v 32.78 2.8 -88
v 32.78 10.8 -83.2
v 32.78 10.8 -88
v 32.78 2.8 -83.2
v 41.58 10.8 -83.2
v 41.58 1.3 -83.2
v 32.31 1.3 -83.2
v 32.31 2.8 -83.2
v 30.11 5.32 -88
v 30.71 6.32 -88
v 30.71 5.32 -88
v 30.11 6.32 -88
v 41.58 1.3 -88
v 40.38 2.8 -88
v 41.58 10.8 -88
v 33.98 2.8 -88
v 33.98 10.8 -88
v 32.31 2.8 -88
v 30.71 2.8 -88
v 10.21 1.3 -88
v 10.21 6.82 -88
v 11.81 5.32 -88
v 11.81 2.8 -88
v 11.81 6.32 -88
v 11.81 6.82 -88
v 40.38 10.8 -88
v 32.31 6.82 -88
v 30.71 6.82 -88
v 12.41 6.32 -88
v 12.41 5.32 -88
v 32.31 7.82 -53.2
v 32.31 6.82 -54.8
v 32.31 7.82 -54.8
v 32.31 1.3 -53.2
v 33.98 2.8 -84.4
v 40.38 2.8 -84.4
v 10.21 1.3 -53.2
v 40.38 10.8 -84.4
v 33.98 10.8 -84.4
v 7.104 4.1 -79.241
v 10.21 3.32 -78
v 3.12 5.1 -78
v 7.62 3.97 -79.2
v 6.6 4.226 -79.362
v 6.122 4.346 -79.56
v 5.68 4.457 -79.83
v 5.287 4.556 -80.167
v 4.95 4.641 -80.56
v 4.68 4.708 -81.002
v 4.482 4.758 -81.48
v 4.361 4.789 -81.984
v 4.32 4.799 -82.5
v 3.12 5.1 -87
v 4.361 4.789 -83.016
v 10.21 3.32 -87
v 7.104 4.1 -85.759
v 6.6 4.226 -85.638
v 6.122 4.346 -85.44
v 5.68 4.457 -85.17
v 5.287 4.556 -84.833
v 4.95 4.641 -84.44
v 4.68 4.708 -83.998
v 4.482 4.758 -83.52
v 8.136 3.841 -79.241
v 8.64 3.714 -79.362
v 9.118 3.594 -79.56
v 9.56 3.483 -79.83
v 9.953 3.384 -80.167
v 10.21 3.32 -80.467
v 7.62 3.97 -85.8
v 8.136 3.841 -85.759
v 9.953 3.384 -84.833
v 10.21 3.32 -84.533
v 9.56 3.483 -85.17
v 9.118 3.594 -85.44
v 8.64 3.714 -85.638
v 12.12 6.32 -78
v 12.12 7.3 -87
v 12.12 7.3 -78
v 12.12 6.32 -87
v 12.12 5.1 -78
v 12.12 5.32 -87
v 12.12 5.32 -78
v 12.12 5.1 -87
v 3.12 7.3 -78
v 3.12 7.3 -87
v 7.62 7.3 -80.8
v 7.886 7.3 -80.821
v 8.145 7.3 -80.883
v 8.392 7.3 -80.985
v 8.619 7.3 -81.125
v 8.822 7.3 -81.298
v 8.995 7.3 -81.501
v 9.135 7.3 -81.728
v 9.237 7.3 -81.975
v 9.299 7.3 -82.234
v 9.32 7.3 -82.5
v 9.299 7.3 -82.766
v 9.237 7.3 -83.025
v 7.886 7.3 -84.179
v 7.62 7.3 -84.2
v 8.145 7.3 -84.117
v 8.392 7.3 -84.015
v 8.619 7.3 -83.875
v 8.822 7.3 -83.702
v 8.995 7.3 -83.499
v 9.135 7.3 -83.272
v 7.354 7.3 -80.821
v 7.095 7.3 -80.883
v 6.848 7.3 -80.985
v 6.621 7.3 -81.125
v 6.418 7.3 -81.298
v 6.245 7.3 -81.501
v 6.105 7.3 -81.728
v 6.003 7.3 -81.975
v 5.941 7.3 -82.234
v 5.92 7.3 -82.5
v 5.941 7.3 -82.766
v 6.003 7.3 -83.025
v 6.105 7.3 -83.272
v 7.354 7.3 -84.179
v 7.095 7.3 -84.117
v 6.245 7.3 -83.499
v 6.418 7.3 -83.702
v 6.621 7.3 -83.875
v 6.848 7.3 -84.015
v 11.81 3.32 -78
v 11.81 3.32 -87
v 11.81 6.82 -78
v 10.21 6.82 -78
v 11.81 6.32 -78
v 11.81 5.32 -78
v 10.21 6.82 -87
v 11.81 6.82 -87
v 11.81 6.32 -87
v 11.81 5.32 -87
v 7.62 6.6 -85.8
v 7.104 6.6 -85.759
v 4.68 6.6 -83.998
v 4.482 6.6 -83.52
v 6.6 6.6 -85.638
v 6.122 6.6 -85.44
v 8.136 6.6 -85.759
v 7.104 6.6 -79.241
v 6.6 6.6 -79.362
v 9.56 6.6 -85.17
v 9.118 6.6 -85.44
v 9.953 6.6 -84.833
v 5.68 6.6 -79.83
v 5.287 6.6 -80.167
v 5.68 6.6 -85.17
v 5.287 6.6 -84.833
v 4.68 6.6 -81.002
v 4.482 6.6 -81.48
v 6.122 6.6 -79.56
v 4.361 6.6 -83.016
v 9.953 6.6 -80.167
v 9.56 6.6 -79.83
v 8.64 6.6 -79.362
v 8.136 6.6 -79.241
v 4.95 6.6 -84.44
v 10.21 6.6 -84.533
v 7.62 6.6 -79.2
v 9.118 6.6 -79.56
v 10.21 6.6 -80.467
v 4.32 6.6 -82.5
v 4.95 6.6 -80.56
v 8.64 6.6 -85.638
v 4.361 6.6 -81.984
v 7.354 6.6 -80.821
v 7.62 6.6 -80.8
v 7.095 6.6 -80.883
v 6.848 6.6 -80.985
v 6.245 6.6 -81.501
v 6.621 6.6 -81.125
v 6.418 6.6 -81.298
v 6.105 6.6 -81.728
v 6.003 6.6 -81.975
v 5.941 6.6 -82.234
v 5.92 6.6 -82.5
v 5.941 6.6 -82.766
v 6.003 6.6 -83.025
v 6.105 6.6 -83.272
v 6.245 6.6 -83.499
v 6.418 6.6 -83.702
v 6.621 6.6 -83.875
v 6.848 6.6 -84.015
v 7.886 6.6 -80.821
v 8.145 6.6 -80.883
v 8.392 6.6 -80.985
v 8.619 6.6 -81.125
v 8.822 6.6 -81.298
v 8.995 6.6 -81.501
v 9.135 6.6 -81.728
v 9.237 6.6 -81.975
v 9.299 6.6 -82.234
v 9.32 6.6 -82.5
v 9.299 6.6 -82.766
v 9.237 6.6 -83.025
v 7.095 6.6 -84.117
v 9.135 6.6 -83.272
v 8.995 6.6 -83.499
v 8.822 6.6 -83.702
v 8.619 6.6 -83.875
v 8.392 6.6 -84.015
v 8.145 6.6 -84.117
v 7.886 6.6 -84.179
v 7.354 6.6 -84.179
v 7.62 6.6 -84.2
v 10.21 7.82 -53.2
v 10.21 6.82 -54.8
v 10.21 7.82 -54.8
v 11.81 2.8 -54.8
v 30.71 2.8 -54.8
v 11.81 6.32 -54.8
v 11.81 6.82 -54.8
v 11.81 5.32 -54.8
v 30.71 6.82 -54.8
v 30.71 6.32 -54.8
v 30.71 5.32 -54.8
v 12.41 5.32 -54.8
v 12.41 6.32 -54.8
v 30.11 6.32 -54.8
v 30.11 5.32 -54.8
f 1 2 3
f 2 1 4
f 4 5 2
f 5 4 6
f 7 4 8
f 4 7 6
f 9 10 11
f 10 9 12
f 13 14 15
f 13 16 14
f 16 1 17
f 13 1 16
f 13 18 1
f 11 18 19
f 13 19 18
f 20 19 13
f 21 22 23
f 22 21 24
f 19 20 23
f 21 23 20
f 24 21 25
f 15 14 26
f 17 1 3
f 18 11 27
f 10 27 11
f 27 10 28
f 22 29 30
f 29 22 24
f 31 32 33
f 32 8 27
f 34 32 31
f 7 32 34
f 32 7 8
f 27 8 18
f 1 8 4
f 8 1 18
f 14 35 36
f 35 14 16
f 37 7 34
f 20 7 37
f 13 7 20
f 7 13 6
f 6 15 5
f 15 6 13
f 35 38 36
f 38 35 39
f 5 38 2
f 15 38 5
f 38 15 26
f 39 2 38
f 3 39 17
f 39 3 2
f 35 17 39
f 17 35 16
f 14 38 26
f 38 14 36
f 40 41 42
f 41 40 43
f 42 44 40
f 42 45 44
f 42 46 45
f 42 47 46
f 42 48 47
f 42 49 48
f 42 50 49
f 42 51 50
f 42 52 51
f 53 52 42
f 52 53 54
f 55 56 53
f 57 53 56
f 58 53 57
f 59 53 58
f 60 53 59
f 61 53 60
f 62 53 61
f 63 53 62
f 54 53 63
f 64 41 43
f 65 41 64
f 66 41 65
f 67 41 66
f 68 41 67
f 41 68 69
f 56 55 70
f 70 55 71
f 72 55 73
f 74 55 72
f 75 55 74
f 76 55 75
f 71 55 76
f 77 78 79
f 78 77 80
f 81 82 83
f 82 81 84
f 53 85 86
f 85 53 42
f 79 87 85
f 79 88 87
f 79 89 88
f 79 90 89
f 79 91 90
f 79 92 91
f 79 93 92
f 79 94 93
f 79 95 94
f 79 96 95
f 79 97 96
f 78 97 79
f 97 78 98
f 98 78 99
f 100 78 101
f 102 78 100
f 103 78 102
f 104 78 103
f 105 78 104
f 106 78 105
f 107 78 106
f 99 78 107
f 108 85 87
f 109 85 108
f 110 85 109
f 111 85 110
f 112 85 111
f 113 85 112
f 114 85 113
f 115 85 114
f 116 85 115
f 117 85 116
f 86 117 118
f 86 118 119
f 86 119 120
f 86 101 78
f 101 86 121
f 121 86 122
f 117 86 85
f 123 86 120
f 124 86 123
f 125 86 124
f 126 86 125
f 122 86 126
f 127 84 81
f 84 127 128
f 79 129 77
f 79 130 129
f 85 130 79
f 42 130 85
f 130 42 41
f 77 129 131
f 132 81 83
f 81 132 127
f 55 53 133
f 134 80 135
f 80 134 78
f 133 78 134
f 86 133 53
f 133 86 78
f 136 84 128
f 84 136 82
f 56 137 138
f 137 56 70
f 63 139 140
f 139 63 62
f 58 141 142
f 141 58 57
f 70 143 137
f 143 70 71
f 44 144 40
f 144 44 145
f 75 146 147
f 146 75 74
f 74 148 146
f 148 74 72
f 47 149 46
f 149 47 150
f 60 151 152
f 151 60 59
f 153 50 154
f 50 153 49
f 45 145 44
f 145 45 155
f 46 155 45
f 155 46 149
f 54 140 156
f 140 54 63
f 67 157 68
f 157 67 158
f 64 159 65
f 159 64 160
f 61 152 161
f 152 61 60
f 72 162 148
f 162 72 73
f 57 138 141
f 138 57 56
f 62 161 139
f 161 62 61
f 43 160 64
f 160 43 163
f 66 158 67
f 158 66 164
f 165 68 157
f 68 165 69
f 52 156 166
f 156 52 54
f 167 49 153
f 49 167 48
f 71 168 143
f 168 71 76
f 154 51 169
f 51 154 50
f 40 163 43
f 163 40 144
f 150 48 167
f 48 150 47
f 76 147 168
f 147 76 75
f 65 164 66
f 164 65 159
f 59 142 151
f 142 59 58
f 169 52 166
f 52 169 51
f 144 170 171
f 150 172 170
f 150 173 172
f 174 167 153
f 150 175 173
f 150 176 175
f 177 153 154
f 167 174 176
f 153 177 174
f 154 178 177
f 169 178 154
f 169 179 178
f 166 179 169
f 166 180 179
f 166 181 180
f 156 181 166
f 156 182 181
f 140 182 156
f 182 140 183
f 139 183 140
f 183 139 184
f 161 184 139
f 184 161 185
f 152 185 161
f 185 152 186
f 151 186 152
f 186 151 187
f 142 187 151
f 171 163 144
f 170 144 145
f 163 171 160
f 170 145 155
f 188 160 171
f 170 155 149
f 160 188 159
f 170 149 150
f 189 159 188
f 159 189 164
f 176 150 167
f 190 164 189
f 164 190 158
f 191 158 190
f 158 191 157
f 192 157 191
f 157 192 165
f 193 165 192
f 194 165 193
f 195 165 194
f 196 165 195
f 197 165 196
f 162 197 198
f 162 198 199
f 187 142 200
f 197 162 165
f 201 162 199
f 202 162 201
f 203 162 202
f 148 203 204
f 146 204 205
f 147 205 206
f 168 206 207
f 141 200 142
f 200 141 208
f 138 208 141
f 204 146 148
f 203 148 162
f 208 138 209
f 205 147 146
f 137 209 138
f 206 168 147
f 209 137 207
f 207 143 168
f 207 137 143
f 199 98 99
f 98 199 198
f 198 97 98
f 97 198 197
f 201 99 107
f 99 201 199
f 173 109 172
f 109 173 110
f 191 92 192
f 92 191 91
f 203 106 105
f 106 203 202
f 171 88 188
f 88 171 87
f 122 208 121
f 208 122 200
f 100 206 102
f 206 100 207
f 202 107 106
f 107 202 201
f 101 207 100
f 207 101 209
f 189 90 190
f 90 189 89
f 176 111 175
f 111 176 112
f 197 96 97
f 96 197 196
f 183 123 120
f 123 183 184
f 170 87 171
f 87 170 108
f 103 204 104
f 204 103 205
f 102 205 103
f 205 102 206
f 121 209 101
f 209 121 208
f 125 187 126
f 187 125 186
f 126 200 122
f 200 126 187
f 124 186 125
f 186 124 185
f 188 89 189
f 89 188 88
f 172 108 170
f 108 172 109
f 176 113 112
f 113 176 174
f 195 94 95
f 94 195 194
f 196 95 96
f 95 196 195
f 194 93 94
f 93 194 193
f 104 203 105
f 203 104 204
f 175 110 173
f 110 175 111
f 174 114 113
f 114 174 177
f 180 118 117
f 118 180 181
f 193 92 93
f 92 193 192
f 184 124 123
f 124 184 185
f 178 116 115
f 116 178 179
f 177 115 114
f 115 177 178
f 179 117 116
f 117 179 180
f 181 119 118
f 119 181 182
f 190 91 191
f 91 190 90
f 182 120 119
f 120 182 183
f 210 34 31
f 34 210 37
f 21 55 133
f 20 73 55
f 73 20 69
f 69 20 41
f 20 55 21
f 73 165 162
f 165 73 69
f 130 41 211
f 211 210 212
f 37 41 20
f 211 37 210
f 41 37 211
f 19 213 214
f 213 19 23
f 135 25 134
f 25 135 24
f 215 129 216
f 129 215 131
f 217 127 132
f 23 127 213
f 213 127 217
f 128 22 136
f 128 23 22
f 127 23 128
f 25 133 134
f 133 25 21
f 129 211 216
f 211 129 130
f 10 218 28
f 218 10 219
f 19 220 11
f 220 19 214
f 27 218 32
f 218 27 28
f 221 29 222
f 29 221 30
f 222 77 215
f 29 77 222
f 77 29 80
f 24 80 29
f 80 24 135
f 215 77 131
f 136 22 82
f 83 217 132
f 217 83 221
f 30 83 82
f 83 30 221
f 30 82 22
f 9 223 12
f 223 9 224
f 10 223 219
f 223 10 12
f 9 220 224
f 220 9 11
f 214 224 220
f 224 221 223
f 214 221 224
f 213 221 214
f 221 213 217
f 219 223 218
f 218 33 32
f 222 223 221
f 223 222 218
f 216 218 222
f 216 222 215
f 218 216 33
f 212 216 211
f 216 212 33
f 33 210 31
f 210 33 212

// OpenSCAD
// SuperMini nRF52840 cradle for Scylla (no-trackball, handwired wireless).  v2 (2026-07-14)
// Designed in the Scylla CASE frame so USB-C registers to the measured slot.
// Measured (STL, 2026-07-14): -Z outer wall z=-90.3 (~2.3mm); USB-C slot (21.26,4.62) 9.75x3.5;
//   reset hole (37.18,4.43) ~5.25dia. Bottom-plate bolt bosses (dia~5.85, seat y=-1.96):
//   nearest-wall = C(-13.21,-82.92); secondary = F(45.10,-40.66).
// v2 changes vs v1: board pocket -> measured 17.91x33.90; reset button 4x4 -> 6x6 and pushed
//   FLUSH to the inner wall (closes the ~5mm gap user reported); + two mounting EARS (to boss C & F)
//   with oversized/slotted holes (tolerance) so USB slot is the primary alignment.
$fn = 40;

// ---- measured case refs ----
usb   = [21.26, 4.62];    // USB-C slot centre (x, y=height)
rst   = [37.18, 4.43];    // reset hole centre
wall_z = -90.3;           // -Z outer wall
wall_t = 2.3;             // wall thickness -> inner face
inner  = wall_z + wall_t; // board front butts here (-88.0)

// ---- SuperMini board (user-measured 17.91 x 33.90) ----
// v3 (2026-07-18): pocket was too tight (board jammed, un-removable). Loosened:
//   bw 18.3->18.9 (~0.5mm/side), bl 34.3->34.8, lip 1.2->0.6 so board slides out.
bw   = 18.9;              // width  + clearance (board 17.91, ~0.5mm/side)
bl   = 34.8;              // length + clearance (board 33.90)
bx0  = usb[0] - bw/2;     // board left x
by   = 2.8;              // PCB bottom height (USB-C centre ~4.6)
fl   = 1.5;              // cradle floor
rail = 1.6;             // side rail
lip  = 0.6;             // retaining lip over board top (light — removable)
railh = (usb[1]-by) + 2.2;  // rail height above floor (over the PCB)

// ---- reset push-button (6x6, user's tactile) held FLUSH to the inner wall ----
btn  = 6.4;              // 6x6 button + clearance
bdep = 3.6;              // button body depth along Z (front face sits at z=inner)
module reset_holder() {
  rx = rst[0];
  // floor arm linking the holder to the cradle's +x rail
  translate([usb[0]+bw/2+rail, by-fl, inner]) cube([rx-btn/2-1.2-(usb[0]+bw/2+rail), fl, bdep+1.2]);
  // floor under the button
  translate([rx-btn/2-1.2, by-fl, inner]) cube([btn+2.4, fl, bdep+1.2]);
  // back stop (+Z) so the button FRONT stays at z=inner (against the case wall) -> no gap
  translate([rx-btn/2-1.2, by-fl, inner+bdep]) cube([btn+2.4, fl+btn+1.6, 1.2]);
  // side walls (X) — open at top to drop the button in, open front (-Z) so actuator reaches the wall hole
  translate([rx-btn/2-1.2, by-fl, inner]) cube([1.2, fl+btn+1.6, bdep+1.2]);
  translate([rx+btn/2,     by-fl, inner]) cube([1.2, fl+btn+1.6, bdep+1.2]);
}

// ---- SINGLE mount -> boss B, the CLOSE boss (v4, 2026-07-18) ----
// User: use the nearer boss. B at x=7.62 is only ~2.6mm left of the cradle rail (rail left face
// x=bx0-rail). B collar-top y≈7.3 ≈ the rail TOP (y≈6.8), so a SHORT near-level tab off the rail
// top reaches it → minimal overhang. M3 screw down into B's insert.
mhc = 3.4;                              // M3 clearance
hbX = 7.62; hbZ = -82.50; hbT = 7.3;    // boss B (close, high collar ≈ rail top)
railTopY = (by-fl) + fl + railh;        // cradle rail top (~6.82)
module mount_tabB(){
  difference(){
    hull(){
      // root: grab the top of the left rail
      translate([bx0-rail, railTopY-3.5, hbZ-4.5]) cube([1.6, 3.5, 9]);
      // pad over boss B (top face at collar height)
      translate([hbX-4.5, hbT-2.2, hbZ-4.5]) cube([9, 2.2, 9]);
    }
    // counterbore so the boss post nests (d~5.9 up to collar) + M3 screw hole through the pad
    translate([hbX, -0.1, hbZ]) rotate([-90,0,0]) cylinder(d=6.6, h=hbT-0.6);
    translate([hbX, hbT-2.4, hbZ]) rotate([-90,0,0]) cylinder(d=mhc, h=4);
  }
}

module cradle() {
  difference() {
    union() {
      // floor under the board
      translate([bx0-rail, by-fl, inner]) cube([bw+2*rail, fl, bl]);
      // side rails
      translate([bx0-rail,        by-fl, inner]) cube([rail, fl+railh, bl]);
      translate([usb[0]+bw/2,     by-fl, inner]) cube([rail, fl+railh, bl]);
      // retaining lips (overhang the board top so it snaps in)
      translate([bx0-rail,            by-fl+railh, inner]) cube([rail+lip, 1.0, bl]);
      translate([usb[0]+bw/2-lip,     by-fl+railh, inner]) cube([rail+lip, 1.0, bl]);
      // back stop (board can't slide in past USB depth)
      translate([bx0-rail, by-fl, inner+bl-1.6]) cube([bw+2*rail, fl+railh+1, 1.6]);
      reset_holder();
      mount_tabB();  // single tab -> boss B (close)
    }
  }
}
cradle();
